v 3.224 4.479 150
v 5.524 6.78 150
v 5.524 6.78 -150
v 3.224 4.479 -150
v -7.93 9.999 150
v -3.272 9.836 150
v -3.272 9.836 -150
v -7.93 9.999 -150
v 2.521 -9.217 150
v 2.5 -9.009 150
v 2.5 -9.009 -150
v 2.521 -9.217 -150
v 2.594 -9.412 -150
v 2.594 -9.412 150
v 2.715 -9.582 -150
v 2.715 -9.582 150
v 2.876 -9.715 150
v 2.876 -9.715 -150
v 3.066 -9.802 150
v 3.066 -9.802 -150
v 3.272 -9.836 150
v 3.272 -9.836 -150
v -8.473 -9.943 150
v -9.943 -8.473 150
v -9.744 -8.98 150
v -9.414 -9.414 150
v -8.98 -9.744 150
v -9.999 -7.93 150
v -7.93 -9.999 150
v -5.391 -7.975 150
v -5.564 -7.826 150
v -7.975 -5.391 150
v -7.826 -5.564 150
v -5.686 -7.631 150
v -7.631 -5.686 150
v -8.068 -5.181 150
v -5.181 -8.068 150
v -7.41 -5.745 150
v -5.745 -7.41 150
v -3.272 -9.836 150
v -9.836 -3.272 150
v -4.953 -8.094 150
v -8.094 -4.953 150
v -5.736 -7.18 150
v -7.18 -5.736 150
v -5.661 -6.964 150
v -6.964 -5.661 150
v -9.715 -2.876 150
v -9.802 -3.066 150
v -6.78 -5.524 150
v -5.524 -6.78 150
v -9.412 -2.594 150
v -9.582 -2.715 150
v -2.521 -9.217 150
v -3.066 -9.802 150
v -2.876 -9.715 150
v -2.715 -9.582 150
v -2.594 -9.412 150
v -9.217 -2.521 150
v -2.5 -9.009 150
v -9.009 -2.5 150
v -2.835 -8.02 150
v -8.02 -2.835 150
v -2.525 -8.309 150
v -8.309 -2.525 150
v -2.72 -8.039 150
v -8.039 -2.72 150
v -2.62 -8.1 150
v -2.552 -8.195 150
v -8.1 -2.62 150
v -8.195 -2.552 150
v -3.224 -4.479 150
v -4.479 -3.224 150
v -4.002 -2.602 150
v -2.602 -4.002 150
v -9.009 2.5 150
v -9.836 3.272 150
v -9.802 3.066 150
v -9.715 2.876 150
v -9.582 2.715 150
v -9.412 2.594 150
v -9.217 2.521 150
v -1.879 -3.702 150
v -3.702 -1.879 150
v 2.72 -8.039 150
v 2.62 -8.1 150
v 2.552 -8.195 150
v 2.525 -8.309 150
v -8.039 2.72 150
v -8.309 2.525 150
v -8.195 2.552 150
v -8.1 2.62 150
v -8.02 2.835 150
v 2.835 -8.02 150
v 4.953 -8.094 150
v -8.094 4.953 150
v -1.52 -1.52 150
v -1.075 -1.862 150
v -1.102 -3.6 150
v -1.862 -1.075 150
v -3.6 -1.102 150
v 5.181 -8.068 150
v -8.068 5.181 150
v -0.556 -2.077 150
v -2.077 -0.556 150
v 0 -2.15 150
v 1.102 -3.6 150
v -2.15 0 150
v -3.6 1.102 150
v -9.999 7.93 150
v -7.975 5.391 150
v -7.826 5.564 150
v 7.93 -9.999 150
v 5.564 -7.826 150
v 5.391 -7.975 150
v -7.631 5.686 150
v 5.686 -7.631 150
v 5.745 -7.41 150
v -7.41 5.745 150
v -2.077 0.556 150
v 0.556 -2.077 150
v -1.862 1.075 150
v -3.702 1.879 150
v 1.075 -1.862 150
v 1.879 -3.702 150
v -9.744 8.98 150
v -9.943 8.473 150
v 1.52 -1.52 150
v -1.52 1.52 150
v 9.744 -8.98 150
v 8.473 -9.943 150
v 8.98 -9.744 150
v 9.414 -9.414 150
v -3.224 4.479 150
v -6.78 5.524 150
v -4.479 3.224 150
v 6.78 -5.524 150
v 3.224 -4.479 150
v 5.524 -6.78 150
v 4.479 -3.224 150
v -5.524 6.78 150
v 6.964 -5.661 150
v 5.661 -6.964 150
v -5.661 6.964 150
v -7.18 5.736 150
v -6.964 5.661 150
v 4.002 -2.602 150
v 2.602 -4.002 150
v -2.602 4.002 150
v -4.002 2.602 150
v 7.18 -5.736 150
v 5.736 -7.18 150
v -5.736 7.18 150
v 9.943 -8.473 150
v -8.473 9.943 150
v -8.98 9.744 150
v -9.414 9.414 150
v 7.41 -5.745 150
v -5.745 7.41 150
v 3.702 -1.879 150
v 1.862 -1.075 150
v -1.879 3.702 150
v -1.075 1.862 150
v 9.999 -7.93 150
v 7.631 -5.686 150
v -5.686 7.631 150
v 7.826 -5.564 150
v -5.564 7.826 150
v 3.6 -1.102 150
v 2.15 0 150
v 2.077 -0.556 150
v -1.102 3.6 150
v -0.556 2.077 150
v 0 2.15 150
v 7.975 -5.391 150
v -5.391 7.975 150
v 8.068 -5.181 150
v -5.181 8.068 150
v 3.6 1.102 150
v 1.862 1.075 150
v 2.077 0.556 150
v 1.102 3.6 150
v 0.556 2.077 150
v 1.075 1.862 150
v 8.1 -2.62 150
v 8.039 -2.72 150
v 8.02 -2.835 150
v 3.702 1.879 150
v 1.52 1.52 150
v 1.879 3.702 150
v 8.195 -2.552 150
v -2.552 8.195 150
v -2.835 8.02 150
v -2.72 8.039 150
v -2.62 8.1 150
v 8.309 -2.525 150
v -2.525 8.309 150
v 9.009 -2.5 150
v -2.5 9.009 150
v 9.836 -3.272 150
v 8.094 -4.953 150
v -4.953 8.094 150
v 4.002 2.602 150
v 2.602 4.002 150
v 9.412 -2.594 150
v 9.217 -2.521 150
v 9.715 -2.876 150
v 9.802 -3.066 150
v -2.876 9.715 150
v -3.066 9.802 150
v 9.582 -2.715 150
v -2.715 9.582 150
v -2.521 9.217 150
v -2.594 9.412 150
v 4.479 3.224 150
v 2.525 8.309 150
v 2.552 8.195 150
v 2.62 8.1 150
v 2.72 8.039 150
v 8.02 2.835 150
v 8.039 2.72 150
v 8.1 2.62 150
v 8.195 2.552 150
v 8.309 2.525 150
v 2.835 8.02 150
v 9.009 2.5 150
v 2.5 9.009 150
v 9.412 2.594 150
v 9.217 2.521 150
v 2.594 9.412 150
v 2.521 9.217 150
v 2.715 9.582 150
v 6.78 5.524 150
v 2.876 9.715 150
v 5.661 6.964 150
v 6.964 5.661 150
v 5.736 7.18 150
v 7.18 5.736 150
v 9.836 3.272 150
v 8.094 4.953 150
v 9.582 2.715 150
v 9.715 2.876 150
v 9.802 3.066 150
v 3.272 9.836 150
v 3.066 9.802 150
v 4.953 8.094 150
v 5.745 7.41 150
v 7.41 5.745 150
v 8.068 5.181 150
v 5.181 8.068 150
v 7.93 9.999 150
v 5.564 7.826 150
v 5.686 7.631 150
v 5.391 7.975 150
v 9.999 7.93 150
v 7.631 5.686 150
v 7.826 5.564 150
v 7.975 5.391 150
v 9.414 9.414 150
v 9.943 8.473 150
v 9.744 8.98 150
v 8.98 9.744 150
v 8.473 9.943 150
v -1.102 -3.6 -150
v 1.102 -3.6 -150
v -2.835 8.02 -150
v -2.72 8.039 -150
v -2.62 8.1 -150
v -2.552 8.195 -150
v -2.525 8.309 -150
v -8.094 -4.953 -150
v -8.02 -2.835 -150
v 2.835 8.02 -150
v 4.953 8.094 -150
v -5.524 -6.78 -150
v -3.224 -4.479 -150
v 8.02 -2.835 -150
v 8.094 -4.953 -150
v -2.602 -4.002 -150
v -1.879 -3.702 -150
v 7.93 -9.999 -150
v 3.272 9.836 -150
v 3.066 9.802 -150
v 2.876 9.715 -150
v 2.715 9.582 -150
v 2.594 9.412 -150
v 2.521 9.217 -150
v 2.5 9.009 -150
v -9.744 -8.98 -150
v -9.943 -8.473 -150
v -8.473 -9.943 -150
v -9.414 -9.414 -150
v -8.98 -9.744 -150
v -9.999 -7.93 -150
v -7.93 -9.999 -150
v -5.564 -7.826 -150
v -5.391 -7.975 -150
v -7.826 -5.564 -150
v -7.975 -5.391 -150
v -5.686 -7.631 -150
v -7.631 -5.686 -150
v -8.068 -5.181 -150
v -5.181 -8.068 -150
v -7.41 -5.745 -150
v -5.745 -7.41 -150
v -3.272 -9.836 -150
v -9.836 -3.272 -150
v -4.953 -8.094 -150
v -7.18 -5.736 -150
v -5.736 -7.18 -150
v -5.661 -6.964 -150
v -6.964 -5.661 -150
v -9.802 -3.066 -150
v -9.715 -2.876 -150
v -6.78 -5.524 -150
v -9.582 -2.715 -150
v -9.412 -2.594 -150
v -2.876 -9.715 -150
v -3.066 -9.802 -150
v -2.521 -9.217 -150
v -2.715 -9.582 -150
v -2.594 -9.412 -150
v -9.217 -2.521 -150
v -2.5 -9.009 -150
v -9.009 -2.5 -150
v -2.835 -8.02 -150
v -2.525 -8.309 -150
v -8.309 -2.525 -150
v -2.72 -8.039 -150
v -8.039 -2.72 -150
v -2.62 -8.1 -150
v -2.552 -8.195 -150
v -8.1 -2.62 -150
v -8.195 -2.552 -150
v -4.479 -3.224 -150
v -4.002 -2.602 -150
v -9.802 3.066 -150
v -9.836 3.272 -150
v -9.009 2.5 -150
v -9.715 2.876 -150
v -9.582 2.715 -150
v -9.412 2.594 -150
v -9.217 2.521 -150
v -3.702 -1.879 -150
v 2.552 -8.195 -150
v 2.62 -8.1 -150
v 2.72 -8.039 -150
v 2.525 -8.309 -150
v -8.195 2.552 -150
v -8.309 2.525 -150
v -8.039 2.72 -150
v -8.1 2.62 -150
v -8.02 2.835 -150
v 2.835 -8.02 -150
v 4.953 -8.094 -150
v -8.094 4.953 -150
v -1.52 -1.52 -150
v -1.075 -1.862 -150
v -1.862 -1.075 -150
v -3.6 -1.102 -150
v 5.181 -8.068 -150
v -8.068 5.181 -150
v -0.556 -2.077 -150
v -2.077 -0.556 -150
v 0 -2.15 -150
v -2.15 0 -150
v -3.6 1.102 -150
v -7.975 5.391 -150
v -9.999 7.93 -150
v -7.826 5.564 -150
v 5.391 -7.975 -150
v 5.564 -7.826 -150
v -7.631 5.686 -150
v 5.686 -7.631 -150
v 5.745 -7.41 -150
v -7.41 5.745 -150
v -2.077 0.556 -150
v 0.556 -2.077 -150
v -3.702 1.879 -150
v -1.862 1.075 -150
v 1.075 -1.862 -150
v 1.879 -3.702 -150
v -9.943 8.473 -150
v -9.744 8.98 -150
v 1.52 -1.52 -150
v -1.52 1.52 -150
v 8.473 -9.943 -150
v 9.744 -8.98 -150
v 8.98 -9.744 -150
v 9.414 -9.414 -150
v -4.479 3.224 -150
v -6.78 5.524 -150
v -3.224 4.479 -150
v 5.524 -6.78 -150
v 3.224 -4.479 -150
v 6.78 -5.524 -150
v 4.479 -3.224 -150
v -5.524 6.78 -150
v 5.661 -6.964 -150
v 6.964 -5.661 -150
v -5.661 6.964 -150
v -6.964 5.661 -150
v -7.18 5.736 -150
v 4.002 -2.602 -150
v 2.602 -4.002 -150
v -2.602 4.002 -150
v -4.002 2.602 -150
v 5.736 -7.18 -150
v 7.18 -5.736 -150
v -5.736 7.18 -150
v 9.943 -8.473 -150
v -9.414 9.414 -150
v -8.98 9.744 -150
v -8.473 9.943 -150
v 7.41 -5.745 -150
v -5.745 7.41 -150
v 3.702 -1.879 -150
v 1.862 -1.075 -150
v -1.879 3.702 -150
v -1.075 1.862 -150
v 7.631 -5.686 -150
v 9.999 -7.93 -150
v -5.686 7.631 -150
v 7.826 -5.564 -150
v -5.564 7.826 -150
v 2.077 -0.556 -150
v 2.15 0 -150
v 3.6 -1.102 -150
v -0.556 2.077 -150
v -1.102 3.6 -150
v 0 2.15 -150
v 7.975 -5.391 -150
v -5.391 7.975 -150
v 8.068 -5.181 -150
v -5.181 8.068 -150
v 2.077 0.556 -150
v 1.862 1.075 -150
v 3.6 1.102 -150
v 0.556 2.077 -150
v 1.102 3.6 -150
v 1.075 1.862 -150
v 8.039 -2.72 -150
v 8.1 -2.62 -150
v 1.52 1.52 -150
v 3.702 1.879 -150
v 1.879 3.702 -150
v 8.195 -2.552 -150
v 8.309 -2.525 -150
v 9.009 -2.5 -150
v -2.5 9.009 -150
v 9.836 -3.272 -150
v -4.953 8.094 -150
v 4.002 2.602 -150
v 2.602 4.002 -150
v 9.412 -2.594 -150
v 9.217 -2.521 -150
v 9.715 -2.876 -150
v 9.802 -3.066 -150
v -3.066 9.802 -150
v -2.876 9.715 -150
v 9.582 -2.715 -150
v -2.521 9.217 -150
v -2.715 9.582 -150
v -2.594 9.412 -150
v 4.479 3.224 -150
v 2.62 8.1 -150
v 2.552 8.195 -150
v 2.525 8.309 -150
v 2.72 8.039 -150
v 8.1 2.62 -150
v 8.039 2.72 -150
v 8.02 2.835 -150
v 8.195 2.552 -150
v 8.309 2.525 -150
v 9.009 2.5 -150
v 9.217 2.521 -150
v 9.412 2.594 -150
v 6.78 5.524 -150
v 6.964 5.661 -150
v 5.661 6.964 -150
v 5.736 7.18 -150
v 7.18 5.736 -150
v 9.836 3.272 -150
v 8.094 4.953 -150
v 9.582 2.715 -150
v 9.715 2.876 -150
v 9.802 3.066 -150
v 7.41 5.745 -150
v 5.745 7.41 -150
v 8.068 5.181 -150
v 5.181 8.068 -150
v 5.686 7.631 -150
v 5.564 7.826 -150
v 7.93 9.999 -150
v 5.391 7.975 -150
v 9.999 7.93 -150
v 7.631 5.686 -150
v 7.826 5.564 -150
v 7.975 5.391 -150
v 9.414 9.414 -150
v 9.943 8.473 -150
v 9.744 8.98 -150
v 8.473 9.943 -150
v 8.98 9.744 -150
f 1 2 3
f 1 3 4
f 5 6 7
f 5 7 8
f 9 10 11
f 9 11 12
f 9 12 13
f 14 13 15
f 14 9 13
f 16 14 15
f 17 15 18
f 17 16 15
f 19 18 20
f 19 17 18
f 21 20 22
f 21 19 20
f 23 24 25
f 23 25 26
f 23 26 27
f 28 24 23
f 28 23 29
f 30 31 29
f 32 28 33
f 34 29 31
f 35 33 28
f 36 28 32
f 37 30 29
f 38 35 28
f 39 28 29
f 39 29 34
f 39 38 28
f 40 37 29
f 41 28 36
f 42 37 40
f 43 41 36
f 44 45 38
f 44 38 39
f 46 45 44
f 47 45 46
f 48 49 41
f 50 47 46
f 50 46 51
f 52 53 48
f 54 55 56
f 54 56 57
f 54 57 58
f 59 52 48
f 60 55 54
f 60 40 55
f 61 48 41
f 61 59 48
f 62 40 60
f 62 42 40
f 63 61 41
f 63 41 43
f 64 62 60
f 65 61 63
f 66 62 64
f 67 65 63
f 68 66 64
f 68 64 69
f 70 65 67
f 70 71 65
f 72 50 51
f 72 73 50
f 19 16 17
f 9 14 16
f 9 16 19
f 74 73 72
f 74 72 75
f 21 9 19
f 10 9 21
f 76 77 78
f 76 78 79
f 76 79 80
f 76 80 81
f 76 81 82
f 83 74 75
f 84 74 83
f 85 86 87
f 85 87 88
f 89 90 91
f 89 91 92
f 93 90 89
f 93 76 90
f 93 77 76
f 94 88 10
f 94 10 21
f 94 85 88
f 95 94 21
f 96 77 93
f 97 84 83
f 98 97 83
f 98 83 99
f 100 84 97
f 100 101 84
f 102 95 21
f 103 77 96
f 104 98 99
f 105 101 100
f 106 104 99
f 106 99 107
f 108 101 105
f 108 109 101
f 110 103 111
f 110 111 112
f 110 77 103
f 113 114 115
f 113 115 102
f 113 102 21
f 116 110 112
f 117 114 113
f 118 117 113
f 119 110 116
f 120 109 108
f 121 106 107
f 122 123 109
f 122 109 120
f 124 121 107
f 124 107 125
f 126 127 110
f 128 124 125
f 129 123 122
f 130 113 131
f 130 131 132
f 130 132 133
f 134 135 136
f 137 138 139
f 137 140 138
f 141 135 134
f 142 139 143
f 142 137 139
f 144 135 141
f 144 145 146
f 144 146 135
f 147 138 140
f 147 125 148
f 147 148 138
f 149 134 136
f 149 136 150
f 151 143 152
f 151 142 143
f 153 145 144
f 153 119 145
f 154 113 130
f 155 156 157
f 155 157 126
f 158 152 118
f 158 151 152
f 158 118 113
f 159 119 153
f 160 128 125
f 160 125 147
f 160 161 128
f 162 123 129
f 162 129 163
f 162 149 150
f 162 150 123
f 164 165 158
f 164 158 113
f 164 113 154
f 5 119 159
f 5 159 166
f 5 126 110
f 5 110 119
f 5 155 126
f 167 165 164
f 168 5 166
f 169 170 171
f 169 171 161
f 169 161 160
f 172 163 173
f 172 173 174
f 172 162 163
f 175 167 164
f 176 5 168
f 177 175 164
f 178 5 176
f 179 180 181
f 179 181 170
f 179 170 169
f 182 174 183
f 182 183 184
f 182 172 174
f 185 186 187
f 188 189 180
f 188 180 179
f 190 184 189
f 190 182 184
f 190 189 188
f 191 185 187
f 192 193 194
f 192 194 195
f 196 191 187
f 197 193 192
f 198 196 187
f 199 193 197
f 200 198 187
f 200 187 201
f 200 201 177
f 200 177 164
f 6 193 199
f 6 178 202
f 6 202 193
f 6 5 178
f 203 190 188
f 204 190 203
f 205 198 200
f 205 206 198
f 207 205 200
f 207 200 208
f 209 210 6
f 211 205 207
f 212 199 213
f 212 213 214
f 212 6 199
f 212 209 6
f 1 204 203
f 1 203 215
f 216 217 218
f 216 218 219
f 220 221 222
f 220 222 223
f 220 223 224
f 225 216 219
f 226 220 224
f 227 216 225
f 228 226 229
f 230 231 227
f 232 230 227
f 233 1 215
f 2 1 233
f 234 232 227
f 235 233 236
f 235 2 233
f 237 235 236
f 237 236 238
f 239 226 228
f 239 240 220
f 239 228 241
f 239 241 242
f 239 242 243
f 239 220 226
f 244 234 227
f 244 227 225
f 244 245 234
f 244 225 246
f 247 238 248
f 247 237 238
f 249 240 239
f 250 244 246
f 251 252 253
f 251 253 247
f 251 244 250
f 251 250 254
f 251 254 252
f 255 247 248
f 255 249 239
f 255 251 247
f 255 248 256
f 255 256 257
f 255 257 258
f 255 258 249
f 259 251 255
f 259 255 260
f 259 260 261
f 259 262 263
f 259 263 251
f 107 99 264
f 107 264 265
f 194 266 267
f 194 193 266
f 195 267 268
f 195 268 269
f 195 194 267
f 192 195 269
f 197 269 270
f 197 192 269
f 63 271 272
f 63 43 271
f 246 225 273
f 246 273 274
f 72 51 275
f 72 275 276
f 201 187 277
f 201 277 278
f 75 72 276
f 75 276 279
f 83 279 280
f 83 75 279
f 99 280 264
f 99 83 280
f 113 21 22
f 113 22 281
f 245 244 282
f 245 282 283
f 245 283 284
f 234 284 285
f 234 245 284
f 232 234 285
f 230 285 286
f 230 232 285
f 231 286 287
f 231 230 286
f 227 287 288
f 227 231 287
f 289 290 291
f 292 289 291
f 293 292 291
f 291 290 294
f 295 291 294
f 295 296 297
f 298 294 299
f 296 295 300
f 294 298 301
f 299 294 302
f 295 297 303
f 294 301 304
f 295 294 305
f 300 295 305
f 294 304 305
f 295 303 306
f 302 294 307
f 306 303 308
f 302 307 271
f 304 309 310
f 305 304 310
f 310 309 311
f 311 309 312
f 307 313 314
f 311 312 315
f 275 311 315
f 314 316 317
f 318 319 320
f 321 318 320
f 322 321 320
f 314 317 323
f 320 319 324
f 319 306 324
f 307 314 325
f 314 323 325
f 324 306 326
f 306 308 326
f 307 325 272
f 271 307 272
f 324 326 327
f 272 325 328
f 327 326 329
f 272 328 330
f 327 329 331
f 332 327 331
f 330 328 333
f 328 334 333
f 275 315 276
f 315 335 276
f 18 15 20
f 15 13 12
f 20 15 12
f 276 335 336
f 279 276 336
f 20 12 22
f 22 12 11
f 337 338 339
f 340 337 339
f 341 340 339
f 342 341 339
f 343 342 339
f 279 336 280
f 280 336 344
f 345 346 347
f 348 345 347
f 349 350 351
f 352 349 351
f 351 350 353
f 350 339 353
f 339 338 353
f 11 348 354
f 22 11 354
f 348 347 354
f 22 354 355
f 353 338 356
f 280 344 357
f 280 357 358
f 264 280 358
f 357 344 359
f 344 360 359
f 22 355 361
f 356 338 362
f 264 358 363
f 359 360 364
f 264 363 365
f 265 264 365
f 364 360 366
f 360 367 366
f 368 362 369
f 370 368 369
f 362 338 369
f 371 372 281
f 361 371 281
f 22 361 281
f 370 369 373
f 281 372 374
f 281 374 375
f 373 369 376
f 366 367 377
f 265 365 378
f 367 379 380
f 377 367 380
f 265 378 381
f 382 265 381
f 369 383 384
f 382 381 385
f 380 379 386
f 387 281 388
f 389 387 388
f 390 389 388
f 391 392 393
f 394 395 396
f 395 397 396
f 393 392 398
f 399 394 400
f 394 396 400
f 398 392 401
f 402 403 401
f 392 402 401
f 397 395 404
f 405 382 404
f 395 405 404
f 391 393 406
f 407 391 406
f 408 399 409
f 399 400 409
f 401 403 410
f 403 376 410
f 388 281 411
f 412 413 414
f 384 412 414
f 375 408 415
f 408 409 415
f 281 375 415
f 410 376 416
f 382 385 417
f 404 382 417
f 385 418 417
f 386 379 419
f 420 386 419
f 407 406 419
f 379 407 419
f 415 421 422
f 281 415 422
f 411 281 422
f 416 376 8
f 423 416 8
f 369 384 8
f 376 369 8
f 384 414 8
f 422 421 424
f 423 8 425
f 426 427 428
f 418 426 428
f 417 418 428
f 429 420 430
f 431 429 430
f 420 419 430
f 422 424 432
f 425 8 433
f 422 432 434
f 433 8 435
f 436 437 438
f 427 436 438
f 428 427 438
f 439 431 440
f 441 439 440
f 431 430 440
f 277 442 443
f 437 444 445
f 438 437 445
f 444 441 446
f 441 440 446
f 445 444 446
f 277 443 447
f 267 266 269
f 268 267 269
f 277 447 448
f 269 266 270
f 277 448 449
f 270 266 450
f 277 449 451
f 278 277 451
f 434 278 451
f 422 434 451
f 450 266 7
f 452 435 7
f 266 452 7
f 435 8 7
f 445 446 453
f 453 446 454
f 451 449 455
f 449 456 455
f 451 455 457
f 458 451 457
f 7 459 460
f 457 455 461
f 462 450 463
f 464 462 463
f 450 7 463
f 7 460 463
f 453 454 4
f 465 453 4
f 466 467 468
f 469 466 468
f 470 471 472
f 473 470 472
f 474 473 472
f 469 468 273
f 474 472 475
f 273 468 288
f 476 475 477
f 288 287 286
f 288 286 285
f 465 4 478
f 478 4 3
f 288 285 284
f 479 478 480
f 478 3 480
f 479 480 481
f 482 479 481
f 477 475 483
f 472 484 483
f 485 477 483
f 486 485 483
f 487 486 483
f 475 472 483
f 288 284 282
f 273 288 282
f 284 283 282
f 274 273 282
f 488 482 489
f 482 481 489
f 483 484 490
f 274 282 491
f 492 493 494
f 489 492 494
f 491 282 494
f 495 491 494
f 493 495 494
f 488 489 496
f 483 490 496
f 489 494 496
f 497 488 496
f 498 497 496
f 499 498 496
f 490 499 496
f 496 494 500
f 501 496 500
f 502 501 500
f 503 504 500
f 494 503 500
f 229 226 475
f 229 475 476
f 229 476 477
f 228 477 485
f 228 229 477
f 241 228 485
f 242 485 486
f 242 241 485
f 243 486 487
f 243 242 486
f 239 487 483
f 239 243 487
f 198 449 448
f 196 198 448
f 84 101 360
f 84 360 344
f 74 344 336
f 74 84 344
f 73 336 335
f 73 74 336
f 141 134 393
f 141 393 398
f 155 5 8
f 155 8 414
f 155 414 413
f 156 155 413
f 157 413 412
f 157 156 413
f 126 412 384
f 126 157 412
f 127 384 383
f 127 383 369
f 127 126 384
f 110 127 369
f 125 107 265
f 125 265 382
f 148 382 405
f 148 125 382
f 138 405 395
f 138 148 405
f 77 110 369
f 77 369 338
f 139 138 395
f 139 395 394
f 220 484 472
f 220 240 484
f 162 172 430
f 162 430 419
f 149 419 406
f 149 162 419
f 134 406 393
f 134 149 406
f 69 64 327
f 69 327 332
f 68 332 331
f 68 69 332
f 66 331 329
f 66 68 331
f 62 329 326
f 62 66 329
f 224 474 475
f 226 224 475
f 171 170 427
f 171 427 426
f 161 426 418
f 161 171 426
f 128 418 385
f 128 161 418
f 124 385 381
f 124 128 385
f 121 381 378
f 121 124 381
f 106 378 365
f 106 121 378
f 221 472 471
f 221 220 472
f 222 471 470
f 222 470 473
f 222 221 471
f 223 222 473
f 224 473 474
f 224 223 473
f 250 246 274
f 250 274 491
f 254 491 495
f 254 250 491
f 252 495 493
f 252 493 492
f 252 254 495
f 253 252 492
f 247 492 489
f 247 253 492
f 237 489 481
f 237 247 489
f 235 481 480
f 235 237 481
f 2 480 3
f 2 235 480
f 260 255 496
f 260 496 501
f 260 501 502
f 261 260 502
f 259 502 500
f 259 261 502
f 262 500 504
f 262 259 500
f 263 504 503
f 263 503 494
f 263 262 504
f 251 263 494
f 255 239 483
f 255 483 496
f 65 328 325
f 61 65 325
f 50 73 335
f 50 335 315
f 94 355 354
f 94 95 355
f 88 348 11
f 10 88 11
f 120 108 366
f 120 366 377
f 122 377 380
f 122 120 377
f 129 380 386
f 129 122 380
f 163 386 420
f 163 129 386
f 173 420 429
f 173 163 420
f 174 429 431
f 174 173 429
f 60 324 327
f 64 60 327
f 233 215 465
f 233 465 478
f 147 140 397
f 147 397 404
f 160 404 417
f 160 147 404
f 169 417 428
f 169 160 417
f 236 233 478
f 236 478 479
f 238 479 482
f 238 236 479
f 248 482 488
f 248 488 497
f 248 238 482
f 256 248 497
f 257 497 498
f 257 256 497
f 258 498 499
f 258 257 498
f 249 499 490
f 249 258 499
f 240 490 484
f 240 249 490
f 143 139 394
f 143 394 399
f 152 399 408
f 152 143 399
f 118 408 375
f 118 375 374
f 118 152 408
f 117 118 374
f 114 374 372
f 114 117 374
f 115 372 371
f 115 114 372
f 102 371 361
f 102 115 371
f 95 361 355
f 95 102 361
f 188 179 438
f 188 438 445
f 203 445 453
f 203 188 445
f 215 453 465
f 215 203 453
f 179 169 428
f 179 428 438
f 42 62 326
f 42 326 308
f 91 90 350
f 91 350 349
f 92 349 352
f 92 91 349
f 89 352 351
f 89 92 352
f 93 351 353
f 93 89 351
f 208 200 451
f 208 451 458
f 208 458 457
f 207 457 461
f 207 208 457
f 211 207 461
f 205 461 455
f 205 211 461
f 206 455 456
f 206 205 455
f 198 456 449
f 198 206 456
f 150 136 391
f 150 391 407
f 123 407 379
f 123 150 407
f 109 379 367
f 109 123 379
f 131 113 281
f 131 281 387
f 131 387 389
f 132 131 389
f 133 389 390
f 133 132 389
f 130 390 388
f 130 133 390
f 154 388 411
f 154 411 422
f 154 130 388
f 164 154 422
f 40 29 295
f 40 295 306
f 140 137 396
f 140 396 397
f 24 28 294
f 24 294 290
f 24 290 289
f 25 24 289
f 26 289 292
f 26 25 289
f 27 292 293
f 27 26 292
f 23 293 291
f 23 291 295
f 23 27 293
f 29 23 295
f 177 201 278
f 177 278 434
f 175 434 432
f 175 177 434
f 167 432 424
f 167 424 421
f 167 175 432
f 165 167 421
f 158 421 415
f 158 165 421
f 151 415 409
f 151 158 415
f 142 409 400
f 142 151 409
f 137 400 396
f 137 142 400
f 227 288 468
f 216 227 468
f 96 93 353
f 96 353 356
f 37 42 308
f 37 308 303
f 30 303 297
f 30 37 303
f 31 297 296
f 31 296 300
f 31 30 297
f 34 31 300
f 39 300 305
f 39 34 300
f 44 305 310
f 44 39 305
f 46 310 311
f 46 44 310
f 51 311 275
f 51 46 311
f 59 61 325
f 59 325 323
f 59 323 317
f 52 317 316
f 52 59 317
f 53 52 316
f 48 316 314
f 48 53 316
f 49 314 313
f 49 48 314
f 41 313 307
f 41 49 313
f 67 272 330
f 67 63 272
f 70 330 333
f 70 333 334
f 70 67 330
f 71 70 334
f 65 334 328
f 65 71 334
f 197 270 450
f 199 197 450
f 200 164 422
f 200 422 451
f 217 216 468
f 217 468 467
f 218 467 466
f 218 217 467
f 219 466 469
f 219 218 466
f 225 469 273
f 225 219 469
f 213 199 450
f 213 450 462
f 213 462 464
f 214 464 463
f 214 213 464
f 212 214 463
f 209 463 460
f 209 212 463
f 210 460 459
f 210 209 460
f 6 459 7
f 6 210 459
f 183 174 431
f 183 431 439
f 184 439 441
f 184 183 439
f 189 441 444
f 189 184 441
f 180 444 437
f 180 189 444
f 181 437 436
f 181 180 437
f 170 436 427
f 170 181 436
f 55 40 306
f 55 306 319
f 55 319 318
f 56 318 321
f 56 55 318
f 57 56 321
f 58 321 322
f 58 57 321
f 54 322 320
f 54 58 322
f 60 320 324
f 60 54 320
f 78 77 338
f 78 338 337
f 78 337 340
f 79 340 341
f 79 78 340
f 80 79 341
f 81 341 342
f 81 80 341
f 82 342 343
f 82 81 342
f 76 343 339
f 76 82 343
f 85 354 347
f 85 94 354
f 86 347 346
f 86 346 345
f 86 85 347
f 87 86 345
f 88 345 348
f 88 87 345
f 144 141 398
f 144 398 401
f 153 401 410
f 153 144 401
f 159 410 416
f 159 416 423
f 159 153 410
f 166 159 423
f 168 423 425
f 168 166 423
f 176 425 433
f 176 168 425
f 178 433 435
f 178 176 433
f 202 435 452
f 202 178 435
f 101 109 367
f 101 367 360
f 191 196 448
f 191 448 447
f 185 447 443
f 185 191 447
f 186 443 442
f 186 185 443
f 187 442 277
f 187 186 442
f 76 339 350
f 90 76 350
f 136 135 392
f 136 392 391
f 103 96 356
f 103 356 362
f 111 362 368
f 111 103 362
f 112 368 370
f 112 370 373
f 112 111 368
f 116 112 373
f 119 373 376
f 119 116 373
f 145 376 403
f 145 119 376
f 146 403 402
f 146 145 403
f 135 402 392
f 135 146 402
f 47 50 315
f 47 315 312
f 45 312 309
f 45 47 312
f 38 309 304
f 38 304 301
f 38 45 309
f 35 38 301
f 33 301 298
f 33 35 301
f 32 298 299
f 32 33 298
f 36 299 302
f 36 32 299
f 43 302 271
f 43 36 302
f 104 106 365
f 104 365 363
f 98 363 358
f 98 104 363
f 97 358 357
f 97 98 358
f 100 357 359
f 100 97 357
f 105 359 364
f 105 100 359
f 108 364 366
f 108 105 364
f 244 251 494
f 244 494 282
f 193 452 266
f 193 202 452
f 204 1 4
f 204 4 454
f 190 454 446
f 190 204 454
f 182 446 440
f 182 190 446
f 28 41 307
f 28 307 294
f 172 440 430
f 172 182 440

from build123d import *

# Parameters (mm, degrees)
BOSS_EXTRUDE1_DEPTH = 150
CIRPATTERN1_COUNT   = 4


with BuildPart() as part:
    # Sketch3 → Boss-Extrude1 (new, symmetric)
    with BuildSketch(Plane.XY):
        with BuildLine():
            Line((-2.524916986, 8.30911066), (-2.500487338, 9.008684239))
            ThreePointArc((-2.500487338, 9.008684239), (-2.714917039, 9.582202525), (-3.272080403, 9.836116498))
            Line((-3.272080403, 9.836116498), (-7.930201007, 9.998781654))
            ThreePointArc((-7.930201007, 9.998781654), (-9.414213562, 9.414213562), (-9.998781654, 7.930201007))
            Line((-9.998781654, 7.930201007), (-9.836116498, 3.272080403))
            ThreePointArc((-9.836116498, 3.272080403), (-9.582202525, 2.714917039), (-9.008684239, 2.500487338))
            Line((-9.008684239, 2.500487338), (-8.30911066, 2.524916986))
            ThreePointArc((-8.30911066, 2.524916986), (-8.100174399, 2.620134726), (-8.019763261, 2.835204083))
            Line((-8.019763261, 2.835204083), (-8.093719461, 4.953032548))
            ThreePointArc((-8.093719461, 4.953032548), (-7.631170264, 5.686128657), (-6.779559917, 5.52444538))
            Line((-6.779559917, 5.52444538), (-4.478679656, 3.22356512))
            ThreePointArc((-4.478679656, 3.22356512), (-3.828361402, 2.250295073), (-3.6, 1.102244776))
            Line((-3.6, 1.102244776), (-3.6, 0))
            Line((-3.6, 0), (-2.15, 0))
            ThreePointArc((-2.15, 0), (-1.52027958, 1.52027958), (0, 2.15))
            Line((0, 2.15), (0, 3.6))
            Line((0, 3.6), (-1.102244776, 3.6))
            ThreePointArc((-1.102244776, 3.6), (-2.250295073, 3.828361402), (-3.22356512, 4.478679656))
            Line((-3.22356512, 4.478679656), (-5.52444538, 6.779559917))
            ThreePointArc((-5.52444538, 6.779559917), (-5.686128657, 7.631170264), (-4.953032548, 8.093719461))
            Line((-4.953032548, 8.093719461), (-2.835204083, 8.019763261))
            ThreePointArc((-2.835204083, 8.019763261), (-2.620134726, 8.100174399), (-2.524916986, 8.30911066))
        make_face()
    extrude(amount=BOSS_EXTRUDE1_DEPTH, both=True)


with BuildPart() as cirpattern1_1:
    # CirPattern1: pattern copy
    add(part.part.rotate(Axis((0, 0, 150), (0, 0, -1)), 1 * 360 / CIRPATTERN1_COUNT))


with BuildPart() as cirpattern1_2:
    # CirPattern1: pattern copy
    add(part.part.rotate(Axis((0, 0, 150), (0, 0, -1)), 2 * 360 / CIRPATTERN1_COUNT))


with BuildPart() as cirpattern1_3:
    # CirPattern1: pattern copy
    add(part.part.rotate(Axis((0, 0, 150), (0, 0, -1)), 3 * 360 / CIRPATTERN1_COUNT))


with BuildPart() as cirpattern1_1_1:
    add(cirpattern1_1.part)

    # Combine1: union CirPattern1_2, CirPattern1_3, part
    add(cirpattern1_2.part)
    add(cirpattern1_3.part)
    add(part.part)


solid = cirpattern1_1_1.part
